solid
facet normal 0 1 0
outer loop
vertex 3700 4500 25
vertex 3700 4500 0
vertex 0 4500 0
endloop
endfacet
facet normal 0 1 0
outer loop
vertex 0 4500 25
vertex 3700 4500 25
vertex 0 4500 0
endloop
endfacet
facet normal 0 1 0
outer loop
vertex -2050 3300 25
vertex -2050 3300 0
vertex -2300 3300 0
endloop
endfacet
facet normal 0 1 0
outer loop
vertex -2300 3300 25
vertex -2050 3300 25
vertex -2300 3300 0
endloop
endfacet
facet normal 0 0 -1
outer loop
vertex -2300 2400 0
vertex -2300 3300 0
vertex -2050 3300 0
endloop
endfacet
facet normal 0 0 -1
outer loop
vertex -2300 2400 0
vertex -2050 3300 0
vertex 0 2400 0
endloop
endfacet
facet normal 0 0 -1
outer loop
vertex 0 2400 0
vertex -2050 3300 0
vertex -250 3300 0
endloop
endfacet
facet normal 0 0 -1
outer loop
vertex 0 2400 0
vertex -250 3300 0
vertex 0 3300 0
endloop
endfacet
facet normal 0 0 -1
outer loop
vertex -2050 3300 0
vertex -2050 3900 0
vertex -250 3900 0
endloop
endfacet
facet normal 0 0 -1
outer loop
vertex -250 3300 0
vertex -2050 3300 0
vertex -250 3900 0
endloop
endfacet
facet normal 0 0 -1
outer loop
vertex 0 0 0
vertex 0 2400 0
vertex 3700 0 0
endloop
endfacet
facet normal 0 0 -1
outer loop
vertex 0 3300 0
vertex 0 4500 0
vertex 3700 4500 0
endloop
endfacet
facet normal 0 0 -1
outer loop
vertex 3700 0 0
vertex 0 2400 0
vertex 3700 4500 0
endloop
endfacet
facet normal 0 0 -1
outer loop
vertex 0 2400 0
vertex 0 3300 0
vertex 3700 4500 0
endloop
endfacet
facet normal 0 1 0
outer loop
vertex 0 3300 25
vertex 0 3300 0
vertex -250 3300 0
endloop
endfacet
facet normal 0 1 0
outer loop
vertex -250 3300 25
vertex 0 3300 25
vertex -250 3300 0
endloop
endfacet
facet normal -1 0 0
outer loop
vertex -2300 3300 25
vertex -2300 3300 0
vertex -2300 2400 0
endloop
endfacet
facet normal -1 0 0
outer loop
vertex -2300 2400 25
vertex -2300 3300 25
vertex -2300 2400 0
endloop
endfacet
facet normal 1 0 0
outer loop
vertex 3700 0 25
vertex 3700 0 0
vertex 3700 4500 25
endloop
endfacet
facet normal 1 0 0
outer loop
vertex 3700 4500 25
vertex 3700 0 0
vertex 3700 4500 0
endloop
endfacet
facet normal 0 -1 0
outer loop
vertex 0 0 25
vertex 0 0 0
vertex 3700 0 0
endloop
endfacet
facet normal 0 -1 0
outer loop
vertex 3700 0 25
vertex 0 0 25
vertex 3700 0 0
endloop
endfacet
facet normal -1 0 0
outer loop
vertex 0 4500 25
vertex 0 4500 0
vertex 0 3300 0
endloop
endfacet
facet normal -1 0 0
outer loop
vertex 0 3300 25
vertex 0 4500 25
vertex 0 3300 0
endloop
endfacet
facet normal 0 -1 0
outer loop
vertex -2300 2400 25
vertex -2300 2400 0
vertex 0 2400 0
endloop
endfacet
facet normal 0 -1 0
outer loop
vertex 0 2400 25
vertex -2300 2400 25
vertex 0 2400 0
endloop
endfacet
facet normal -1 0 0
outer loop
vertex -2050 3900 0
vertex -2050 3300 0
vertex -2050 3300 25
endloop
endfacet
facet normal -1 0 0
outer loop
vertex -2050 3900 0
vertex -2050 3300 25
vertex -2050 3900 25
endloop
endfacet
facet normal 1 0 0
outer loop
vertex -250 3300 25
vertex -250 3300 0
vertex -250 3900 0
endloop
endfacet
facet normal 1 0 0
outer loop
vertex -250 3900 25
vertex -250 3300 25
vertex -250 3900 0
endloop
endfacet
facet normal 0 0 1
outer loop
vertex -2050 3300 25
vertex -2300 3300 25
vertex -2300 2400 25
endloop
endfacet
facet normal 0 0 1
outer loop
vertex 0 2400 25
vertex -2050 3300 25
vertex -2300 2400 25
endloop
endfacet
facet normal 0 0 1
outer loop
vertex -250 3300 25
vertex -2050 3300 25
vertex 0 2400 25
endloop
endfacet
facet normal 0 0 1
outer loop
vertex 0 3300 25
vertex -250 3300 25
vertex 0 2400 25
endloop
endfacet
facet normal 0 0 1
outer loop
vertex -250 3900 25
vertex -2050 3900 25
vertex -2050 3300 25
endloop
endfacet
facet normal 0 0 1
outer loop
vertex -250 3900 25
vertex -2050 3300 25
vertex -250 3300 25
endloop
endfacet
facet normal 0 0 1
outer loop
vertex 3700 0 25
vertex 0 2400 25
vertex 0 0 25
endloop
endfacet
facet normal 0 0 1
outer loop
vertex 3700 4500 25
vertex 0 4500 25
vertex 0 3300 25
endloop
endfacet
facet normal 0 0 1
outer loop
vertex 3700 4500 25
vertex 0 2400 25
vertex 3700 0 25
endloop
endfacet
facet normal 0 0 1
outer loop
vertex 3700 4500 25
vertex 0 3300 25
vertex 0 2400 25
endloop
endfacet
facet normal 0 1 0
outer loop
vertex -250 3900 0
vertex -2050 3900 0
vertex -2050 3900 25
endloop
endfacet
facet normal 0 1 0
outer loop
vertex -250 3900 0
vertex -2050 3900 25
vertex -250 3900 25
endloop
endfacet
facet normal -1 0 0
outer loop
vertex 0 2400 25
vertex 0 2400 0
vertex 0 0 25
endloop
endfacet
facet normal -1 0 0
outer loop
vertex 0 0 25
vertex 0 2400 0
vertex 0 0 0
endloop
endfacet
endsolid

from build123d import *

# Parameters (mm, degrees)
F0_W     = 1800
F0_H     = 600
F1_DEPTH = 25


with BuildPart() as f1:
    # F0 (on Top) → F1 (new body)
    with BuildSketch(Plane.XY):
        with BuildLine():
            Line((0, 2400), (0, 0))
            Line((0, 0), (3700, 0))
            Line((3700, 0), (3700, 4500))
            Line((3700, 4500), (0, 4500))
            Line((0, 4500), (0, 3300))
            Line((0, 3300), (-250, 3300))
            Line((-250, 3300), (-2050, 3300))
            Line((-2050, 3300), (-2300, 3300))
            Line((-2300, 3300), (-2300, 3100))
            ThreePointArc((-2300, 3100), (-1875.735931, 2924.264069), (-1700, 2500))
            Line((-1700, 2500), (-2300, 2500))
            Line((-2300, 2500), (-2300, 2400))
            Line((-2300, 2400), (0, 2400))
        make_face()
        with BuildLine():
            Line((-2300, 3100), (-2300, 2500))
            Line((-2300, 2500), (-1700, 2500))
            ThreePointArc((-1700, 2500), (-1875.735931, 2924.264069), (-2300, 3100))
        make_face()
        with Locations((-1150, 3600)):
            Rectangle(F0_W, F0_H)
    extrude(amount=F1_DEPTH)


solid = f1.part
